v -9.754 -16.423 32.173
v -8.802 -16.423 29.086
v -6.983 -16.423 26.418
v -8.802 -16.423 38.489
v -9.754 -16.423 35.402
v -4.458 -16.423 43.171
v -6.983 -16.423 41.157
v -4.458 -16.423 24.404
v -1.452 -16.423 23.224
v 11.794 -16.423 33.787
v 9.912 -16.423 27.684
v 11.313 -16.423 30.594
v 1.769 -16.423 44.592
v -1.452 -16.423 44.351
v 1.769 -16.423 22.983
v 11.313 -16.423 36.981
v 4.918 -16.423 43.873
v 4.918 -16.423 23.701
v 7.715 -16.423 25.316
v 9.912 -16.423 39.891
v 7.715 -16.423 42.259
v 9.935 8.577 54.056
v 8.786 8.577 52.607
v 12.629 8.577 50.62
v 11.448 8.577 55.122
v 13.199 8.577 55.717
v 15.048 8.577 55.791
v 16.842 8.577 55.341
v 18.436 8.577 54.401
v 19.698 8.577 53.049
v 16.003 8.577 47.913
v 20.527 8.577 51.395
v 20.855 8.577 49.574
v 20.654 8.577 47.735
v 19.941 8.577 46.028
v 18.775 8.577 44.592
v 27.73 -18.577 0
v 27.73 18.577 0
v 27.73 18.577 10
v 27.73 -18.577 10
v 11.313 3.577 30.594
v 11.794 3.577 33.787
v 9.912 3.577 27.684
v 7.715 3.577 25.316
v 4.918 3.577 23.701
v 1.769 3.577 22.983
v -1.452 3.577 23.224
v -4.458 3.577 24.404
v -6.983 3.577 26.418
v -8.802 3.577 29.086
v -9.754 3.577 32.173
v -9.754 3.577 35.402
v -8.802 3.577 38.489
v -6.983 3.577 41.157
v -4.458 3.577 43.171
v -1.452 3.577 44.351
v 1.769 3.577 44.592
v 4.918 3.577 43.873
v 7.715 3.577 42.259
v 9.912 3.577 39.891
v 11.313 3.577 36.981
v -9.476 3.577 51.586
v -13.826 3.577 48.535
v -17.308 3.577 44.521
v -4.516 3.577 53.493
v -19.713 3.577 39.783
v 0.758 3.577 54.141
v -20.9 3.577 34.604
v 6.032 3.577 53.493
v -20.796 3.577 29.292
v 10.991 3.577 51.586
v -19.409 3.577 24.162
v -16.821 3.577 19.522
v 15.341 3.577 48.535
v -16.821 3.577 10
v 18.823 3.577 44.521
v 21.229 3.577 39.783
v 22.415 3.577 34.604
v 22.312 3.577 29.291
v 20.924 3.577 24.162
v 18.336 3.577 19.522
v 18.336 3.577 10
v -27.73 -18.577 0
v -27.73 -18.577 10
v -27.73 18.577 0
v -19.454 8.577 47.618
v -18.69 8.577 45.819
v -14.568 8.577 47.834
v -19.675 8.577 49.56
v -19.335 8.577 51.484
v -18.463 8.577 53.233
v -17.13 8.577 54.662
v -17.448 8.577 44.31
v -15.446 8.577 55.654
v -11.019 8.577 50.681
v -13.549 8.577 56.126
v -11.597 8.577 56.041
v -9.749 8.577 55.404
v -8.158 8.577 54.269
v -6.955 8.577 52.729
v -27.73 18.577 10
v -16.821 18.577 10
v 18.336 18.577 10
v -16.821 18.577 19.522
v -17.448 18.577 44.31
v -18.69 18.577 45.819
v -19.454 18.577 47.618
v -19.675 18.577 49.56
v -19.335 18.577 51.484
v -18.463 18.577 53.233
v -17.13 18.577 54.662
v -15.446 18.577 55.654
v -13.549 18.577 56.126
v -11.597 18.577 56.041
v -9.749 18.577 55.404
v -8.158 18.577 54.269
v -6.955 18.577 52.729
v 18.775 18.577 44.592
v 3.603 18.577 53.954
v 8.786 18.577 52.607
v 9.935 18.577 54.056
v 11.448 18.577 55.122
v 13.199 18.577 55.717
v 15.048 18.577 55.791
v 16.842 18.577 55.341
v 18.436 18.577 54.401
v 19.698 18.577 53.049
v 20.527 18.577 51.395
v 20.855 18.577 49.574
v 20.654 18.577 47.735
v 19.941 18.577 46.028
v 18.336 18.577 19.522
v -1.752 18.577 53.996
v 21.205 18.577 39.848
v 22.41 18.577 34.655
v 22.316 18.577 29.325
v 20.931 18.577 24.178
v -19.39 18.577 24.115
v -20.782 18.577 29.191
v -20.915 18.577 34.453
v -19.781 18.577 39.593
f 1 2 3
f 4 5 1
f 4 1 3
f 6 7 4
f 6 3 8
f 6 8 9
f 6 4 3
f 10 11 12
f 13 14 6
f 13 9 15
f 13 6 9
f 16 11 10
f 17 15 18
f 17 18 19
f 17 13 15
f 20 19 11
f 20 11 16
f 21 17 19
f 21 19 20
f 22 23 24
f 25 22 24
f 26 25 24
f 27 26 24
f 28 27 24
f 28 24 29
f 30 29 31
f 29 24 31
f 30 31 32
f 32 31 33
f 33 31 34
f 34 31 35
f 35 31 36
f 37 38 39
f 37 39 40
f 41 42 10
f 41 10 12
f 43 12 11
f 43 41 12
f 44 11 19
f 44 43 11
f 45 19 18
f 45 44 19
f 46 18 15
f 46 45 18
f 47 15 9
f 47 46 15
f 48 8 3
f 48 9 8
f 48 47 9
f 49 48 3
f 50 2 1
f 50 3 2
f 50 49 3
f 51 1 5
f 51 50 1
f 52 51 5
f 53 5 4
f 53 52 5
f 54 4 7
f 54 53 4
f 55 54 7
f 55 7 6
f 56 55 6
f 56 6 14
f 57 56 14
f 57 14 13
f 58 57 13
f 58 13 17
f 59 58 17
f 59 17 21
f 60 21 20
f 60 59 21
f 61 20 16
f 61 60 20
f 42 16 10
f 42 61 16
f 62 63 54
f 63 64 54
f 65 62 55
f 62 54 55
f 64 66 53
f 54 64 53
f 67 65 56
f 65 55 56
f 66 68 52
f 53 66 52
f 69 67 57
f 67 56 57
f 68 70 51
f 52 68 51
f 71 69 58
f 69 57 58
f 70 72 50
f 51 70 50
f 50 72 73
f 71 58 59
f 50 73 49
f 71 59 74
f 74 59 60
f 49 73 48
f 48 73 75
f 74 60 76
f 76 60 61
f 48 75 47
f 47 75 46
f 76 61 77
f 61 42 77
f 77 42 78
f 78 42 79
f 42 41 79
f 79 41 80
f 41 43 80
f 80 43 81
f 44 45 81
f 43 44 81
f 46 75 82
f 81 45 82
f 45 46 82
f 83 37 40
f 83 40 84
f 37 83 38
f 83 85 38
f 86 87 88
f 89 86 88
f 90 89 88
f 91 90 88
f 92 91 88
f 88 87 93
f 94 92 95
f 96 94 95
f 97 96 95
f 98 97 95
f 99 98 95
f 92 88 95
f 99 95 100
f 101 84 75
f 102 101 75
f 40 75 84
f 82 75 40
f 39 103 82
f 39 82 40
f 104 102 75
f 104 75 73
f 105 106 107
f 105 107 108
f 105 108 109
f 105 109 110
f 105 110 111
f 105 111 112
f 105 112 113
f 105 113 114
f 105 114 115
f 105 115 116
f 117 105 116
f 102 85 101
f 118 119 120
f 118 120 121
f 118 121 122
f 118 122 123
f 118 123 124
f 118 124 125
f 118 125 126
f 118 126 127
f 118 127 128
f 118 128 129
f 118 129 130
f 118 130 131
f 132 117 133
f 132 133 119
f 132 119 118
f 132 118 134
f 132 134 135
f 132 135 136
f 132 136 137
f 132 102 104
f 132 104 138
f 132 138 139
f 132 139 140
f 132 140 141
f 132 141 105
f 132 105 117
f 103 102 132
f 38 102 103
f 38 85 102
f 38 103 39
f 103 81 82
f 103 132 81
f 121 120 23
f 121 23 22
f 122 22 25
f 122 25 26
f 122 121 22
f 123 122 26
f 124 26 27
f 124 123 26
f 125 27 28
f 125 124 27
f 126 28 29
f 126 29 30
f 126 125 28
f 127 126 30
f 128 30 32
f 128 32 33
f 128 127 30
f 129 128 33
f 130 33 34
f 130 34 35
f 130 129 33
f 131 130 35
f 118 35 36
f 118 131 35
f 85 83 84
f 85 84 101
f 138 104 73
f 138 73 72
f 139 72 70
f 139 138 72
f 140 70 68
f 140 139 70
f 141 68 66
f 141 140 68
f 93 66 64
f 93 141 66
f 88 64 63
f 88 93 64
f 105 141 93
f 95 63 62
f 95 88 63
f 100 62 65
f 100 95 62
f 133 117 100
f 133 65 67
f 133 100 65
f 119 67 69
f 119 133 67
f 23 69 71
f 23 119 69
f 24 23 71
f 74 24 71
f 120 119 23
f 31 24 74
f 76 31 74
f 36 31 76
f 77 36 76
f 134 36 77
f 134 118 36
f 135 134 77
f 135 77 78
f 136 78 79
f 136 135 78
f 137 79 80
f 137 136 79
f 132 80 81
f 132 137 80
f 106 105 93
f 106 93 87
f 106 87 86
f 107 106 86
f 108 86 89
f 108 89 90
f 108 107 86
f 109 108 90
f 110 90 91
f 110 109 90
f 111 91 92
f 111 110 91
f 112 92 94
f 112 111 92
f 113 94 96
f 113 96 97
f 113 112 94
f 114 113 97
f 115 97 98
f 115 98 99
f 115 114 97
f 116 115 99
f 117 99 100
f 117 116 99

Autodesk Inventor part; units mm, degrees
ref_plane "YZ Plane" through (0, 0, 0) normal (1, 0, 0) x (0, 1, 0)
ref_plane "XZ Plane" through (0, 0, 0) normal (0, 1, 0) x (-1, 0, 0)
ref_plane "XY Plane" through (0, 0, 0) normal (0, 0, 1) x (1, 0, 0)
sketch "스케치1" plane through (0, 0, 0) normal (0, 0, 1) x (1, 0, 0)
  line L0 (27.7299, -18.5773) -> (-27.7299, -18.5773)
  line L1 (-27.7299, -18.5773) -> (-27.7299, 18.5773)
  line L2 (-27.7299, 18.5773) -> (27.7299, 18.5773)
  line L3 (27.7299, 18.5773) -> (27.7299, -18.5773)
  line L4 (27.7299, -18.5773) -> (-27.7299, 18.5773) construction
  line L5 (-27.7299, -18.5773) -> (27.7299, 18.5773) construction
  point P0 (0, 0)
extrude "돌출1" add sketch "스케치1" along normal blind 10
sketch "스케치2" plane through (0, 0, 10) normal (0, 0, 1) x (1, 0, 0)
  line L0 (27.7299, 18.5773) -> (-27.7299, 18.5773) projected
  line L1 (-19.7299, 18.5773) -> (19.7299, 18.5773)
  line L2 (19.7299, 18.5773) -> (19.7299, 3.5485)
  line L3 (19.7299, 3.5485) -> (-19.7299, 3.5485)
  line L4 (-19.7299, 3.5485) -> (-19.7299, 18.5773)
  line L5 (27.7299, -18.5773) -> (27.7299, 18.5773) projected
  line L6 (-27.7299, 18.5773) -> (-27.7299, -18.5773) projected
  point P0 (0, 0)
  dimension "d2" = 8
  dimension "d3" = 8
sketch "스케치3" plane through (-27.7299, 18.5773, 0) normal (0, 1, 0) x (1, 0, 0)
  line L0 (0, -10) -> (55.4598, -10) projected
  line L1 (46.066, -10) -> (10.9091, -10)
  line L2 (10.9091, -10) -> (10.9091, -19.7265)
  line L3 (10.9091, -19.7265) -> (46.066, -19.7265)
  line L4 (46.066, -19.7265) -> (46.066, -10)
  circle A0 centre (28.4876, -32.3685) radius 21.7725
  point P0 (27.7299, 0)
extrude "돌출2" add sketch "스케치3" against normal blind 15
sketch "스케치4" plane through (-27.7299, 3.5773, 0) normal (0, -1, 0) x (1, 0, 0)
  circle A0 centre (28.6894, 33.7874) radius 10.835
  arc A1 (46.066, 19.5217) -> (10.9091, 19.5217) centre (28.4876, 32.3685) ccw projected
  arc A2 (46.2263, 44.9931) -> (36.5571, 52.5904) centre (41.9392, 49.4885) ccw
  arc A3 (21.0294, 52.8238) -> (10.3775, 44.4543) centre (15.036, 49.4885) ccw
  point P0 (27.7299, 0)
extrude "돌출3" add sketch "스케치4" along normal blind 20 contours A0
sketch "스케치5" plane through (-27.7299, 18.5773, 0) normal (0, 1, 0) x (1, 0, 0)
  arc A0 (10.9091, -19.5217) -> (46.066, -19.5217) centre (28.4876, -32.3685) ccw projected
  arc A1 (10.2823, -44.3105) -> (20.7748, -52.7291) centre (14.8621, -49.3505) ccw
  arc A2 (36.5162, -52.6067) -> (46.5049, -44.5922) centre (42.1131, -49.3505) ccw
  point P0 (27.7299, 0)
extrude "돌출4" add sketch "스케치5" against normal blind 10
properties part number "240626_part2"
